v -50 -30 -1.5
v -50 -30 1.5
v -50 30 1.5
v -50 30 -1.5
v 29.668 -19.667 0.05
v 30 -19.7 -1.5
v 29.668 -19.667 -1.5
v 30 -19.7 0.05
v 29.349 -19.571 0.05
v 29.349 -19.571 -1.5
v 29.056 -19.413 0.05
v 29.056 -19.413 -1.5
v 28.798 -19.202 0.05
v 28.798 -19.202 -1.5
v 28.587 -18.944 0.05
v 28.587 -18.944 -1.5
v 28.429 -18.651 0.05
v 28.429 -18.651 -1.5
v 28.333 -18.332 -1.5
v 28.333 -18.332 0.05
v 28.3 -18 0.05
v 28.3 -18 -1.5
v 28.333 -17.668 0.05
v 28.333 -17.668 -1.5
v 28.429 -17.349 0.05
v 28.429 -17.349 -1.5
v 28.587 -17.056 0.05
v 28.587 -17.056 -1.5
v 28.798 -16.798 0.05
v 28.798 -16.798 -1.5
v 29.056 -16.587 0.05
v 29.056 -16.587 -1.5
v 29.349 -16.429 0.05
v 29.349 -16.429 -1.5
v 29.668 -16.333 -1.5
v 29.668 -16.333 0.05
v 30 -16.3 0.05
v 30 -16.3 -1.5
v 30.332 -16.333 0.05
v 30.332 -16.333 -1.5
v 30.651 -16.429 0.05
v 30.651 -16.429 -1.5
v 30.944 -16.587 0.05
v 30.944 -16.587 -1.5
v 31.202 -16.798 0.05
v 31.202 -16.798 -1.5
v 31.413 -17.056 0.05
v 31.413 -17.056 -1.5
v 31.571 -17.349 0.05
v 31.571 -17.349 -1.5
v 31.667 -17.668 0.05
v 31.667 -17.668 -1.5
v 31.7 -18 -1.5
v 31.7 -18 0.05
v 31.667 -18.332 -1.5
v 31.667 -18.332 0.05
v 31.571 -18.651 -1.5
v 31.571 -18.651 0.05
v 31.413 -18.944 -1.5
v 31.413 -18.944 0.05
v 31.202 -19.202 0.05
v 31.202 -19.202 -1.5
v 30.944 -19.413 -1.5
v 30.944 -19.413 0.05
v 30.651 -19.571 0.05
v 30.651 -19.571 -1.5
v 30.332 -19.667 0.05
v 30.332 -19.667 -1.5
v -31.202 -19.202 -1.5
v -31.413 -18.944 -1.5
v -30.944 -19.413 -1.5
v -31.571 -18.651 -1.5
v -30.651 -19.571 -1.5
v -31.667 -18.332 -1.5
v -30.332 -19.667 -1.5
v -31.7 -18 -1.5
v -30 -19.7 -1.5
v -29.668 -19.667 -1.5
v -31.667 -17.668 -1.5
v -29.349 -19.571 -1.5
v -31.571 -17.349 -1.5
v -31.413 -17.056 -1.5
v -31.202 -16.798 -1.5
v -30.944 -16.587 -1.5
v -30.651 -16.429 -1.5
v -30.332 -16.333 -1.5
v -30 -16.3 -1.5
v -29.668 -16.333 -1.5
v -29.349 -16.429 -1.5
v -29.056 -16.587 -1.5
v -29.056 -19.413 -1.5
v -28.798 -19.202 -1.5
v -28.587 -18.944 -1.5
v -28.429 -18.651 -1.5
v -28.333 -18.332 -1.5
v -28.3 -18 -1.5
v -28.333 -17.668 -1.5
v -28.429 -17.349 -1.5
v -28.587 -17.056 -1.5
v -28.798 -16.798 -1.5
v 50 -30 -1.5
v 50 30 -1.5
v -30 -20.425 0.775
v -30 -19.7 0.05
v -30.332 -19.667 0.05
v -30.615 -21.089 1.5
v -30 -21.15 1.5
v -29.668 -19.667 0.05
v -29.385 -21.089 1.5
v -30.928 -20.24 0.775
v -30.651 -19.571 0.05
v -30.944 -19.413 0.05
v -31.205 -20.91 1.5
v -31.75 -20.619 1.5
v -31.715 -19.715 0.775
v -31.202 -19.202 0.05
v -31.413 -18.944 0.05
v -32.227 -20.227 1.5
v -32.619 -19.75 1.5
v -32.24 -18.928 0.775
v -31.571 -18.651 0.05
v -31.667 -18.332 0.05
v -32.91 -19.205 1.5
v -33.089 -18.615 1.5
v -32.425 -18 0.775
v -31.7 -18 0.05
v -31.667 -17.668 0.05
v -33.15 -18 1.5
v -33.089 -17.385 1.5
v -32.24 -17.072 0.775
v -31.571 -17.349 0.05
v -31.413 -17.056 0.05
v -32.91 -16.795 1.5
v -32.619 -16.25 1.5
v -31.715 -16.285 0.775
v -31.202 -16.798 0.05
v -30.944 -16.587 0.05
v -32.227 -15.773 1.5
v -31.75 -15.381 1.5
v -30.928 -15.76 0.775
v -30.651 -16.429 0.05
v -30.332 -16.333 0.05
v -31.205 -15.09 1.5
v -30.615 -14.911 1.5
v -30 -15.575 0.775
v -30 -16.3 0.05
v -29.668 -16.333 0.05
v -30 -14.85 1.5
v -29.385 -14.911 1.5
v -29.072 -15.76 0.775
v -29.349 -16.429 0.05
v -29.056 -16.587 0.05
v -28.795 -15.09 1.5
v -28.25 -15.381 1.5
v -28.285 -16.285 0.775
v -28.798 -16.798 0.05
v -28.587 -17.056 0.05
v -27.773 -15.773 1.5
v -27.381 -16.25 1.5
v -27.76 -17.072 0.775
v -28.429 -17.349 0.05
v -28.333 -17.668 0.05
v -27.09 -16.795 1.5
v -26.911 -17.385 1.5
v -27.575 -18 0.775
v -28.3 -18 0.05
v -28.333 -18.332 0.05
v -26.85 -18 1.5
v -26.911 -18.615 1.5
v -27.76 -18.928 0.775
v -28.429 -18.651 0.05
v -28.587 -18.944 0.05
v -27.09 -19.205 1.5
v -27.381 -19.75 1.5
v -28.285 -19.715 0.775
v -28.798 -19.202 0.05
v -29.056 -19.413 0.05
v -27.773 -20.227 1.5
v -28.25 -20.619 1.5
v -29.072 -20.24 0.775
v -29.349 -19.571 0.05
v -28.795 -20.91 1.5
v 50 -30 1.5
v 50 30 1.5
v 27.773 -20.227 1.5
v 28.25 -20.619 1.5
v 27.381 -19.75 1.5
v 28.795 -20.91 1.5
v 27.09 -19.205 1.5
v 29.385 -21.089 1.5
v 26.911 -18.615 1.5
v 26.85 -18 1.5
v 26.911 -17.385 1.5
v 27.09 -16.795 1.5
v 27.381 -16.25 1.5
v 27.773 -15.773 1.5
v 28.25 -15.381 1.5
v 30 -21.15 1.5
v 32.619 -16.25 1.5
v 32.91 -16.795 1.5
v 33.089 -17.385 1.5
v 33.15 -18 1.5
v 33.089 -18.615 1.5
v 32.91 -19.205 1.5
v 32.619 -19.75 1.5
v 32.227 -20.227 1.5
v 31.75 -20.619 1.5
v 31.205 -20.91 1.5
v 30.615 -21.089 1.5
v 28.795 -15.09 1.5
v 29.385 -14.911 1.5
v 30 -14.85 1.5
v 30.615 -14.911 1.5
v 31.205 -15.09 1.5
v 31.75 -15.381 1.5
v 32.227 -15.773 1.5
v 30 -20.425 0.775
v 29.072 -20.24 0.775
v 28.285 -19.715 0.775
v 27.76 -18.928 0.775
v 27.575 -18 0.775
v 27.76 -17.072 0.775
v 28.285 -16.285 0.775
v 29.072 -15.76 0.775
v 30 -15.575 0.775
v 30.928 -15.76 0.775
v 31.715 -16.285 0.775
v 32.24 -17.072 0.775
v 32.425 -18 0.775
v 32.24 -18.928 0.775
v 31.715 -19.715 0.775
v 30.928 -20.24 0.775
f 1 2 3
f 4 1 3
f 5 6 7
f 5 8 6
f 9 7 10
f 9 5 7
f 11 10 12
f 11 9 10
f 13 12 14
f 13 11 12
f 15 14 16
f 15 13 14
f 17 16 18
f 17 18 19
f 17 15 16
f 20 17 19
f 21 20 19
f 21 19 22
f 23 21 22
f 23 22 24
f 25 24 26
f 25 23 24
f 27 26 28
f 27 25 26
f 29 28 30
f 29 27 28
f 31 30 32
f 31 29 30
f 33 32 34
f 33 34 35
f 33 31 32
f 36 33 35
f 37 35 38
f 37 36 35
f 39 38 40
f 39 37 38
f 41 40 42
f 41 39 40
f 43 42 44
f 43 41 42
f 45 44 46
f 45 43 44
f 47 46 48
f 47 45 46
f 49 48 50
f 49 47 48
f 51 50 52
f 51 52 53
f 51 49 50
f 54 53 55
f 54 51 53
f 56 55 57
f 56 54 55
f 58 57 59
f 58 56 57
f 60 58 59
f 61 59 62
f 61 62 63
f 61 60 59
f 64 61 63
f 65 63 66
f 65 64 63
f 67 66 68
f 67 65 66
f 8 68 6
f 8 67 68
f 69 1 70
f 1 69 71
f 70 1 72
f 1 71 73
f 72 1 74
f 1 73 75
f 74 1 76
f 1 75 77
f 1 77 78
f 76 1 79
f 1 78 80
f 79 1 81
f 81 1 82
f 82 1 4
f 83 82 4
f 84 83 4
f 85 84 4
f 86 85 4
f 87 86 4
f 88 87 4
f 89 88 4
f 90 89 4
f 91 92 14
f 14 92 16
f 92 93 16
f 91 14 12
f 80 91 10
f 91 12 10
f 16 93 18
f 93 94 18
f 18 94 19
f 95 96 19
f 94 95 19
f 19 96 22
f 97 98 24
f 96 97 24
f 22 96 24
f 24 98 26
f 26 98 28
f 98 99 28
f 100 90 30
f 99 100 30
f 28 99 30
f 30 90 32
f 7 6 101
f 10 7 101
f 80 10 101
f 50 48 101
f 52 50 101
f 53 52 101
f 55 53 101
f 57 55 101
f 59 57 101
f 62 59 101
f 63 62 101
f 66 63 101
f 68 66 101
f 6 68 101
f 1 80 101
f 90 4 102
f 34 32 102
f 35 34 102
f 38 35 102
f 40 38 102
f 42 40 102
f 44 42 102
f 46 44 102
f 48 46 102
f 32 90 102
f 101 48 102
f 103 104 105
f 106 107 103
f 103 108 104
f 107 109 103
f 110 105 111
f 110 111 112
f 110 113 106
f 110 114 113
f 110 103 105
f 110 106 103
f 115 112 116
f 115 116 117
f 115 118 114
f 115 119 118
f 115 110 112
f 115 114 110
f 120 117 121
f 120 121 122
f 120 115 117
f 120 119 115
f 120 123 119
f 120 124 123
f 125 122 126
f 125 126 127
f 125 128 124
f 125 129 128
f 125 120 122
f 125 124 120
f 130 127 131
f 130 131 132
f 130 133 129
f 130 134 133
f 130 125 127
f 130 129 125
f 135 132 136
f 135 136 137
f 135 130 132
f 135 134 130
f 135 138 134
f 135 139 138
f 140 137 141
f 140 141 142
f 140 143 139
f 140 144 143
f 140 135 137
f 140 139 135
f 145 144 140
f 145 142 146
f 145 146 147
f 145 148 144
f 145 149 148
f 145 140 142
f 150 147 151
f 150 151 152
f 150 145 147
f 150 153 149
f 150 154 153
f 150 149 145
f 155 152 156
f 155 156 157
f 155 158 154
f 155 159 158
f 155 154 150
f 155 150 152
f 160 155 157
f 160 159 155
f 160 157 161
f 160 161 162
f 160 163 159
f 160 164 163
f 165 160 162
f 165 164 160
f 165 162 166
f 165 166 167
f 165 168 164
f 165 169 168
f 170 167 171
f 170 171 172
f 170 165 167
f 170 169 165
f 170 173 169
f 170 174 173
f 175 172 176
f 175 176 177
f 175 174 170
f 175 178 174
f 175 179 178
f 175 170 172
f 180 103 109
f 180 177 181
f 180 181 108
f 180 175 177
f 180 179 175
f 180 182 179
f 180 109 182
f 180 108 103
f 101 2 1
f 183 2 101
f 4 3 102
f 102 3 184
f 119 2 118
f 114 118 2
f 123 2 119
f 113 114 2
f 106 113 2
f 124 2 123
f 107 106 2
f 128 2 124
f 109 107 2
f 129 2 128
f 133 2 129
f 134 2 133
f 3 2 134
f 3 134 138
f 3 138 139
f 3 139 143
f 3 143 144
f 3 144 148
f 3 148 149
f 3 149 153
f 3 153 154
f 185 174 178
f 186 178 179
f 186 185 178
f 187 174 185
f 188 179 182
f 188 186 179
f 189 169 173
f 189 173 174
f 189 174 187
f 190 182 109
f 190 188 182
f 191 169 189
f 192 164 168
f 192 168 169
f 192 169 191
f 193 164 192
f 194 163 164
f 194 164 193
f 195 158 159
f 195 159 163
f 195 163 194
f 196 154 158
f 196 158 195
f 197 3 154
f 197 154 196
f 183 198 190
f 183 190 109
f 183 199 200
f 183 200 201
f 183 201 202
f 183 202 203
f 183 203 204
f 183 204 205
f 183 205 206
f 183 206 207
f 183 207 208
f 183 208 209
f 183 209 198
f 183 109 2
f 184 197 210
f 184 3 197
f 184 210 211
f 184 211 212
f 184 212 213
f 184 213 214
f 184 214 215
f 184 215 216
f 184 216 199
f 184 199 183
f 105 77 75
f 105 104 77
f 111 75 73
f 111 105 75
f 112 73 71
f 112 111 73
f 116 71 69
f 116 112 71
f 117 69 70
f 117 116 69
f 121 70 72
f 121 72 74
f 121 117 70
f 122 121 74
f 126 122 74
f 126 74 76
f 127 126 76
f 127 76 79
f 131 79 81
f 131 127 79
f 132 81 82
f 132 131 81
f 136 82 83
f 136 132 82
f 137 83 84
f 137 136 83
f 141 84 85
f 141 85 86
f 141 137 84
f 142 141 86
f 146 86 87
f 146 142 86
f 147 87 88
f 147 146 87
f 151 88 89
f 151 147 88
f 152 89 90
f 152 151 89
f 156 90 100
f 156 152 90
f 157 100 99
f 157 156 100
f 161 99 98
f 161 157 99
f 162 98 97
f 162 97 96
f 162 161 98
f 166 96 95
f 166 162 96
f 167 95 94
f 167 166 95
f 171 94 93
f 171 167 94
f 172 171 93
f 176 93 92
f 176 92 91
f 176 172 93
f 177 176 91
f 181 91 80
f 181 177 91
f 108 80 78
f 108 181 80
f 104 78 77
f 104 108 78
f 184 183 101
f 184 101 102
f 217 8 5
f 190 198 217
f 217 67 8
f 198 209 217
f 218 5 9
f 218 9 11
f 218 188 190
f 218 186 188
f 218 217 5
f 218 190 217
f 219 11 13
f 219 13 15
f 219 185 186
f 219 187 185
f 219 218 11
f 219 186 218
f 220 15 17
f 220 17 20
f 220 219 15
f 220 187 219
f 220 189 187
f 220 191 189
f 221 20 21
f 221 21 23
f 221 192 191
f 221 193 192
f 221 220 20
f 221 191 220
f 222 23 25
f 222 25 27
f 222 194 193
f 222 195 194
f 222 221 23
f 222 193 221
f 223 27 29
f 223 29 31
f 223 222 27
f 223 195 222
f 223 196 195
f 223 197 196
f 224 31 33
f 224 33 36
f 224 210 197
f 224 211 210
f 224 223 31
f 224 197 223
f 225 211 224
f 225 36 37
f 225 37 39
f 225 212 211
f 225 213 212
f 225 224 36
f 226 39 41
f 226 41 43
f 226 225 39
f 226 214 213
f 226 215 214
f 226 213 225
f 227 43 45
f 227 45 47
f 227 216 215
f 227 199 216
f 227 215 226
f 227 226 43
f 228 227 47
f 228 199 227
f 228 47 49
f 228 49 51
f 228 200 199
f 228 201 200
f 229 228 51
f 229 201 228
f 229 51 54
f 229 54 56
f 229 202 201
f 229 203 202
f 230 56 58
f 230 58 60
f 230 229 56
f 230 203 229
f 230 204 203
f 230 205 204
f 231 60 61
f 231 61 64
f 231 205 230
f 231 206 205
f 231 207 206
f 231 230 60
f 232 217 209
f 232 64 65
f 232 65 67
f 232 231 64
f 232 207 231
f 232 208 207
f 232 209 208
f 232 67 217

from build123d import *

# Parameters (mm, degrees)
SKETCH1_W                                    = 100
SKETCH1_H                                    = 60
BOSS_EXTRUDE1_DEPTH                          = 1.5
CSK_FOR_M3_COUNTERSUNK_FLAT_HEAD_SCR_2_COUNT = 2
CSK_FOR_M3_COUNTERSUNK_FLAT_HEAD_SCR_2_PITCH = 60


with BuildPart() as part:
    # Sketch1 → Boss-Extrude1 (new, symmetric)
    with BuildSketch(Plane.XY):
        Rectangle(SKETCH1_W, SKETCH1_H)
    extrude(amount=BOSS_EXTRUDE1_DEPTH, both=True)

    # Sketch3 → CSK for M3 Countersunk Flat Head Screw1 (revolve, cut)
    with BuildSketch(Plane(origin=(-30, -18, 1.5), x_dir=(0, -1, 0), z_dir=(1, 0, 0))):
        Polygon((0, 0), (0, 3), (1.7, 3), (1.7, 1.45), (3.15, 0), align=None)
    csk_for_m3_countersunk_flat_head_screw1 = revolve(axis=Axis((-30, -18, 7.85), (0, 0, -1)), mode=Mode.SUBTRACT)

    # CSK for M3 Countersunk Flat Head Scr 2: CSK for M3 Countersunk Flat Head Screw1 ×2
    with Locations(*[(i * CSK_FOR_M3_COUNTERSUNK_FLAT_HEAD_SCR_2_PITCH, 0, 0) for i in range(1, CSK_FOR_M3_COUNTERSUNK_FLAT_HEAD_SCR_2_COUNT)]):
        add(csk_for_m3_countersunk_flat_head_screw1, mode=Mode.SUBTRACT)


solid = part.part
